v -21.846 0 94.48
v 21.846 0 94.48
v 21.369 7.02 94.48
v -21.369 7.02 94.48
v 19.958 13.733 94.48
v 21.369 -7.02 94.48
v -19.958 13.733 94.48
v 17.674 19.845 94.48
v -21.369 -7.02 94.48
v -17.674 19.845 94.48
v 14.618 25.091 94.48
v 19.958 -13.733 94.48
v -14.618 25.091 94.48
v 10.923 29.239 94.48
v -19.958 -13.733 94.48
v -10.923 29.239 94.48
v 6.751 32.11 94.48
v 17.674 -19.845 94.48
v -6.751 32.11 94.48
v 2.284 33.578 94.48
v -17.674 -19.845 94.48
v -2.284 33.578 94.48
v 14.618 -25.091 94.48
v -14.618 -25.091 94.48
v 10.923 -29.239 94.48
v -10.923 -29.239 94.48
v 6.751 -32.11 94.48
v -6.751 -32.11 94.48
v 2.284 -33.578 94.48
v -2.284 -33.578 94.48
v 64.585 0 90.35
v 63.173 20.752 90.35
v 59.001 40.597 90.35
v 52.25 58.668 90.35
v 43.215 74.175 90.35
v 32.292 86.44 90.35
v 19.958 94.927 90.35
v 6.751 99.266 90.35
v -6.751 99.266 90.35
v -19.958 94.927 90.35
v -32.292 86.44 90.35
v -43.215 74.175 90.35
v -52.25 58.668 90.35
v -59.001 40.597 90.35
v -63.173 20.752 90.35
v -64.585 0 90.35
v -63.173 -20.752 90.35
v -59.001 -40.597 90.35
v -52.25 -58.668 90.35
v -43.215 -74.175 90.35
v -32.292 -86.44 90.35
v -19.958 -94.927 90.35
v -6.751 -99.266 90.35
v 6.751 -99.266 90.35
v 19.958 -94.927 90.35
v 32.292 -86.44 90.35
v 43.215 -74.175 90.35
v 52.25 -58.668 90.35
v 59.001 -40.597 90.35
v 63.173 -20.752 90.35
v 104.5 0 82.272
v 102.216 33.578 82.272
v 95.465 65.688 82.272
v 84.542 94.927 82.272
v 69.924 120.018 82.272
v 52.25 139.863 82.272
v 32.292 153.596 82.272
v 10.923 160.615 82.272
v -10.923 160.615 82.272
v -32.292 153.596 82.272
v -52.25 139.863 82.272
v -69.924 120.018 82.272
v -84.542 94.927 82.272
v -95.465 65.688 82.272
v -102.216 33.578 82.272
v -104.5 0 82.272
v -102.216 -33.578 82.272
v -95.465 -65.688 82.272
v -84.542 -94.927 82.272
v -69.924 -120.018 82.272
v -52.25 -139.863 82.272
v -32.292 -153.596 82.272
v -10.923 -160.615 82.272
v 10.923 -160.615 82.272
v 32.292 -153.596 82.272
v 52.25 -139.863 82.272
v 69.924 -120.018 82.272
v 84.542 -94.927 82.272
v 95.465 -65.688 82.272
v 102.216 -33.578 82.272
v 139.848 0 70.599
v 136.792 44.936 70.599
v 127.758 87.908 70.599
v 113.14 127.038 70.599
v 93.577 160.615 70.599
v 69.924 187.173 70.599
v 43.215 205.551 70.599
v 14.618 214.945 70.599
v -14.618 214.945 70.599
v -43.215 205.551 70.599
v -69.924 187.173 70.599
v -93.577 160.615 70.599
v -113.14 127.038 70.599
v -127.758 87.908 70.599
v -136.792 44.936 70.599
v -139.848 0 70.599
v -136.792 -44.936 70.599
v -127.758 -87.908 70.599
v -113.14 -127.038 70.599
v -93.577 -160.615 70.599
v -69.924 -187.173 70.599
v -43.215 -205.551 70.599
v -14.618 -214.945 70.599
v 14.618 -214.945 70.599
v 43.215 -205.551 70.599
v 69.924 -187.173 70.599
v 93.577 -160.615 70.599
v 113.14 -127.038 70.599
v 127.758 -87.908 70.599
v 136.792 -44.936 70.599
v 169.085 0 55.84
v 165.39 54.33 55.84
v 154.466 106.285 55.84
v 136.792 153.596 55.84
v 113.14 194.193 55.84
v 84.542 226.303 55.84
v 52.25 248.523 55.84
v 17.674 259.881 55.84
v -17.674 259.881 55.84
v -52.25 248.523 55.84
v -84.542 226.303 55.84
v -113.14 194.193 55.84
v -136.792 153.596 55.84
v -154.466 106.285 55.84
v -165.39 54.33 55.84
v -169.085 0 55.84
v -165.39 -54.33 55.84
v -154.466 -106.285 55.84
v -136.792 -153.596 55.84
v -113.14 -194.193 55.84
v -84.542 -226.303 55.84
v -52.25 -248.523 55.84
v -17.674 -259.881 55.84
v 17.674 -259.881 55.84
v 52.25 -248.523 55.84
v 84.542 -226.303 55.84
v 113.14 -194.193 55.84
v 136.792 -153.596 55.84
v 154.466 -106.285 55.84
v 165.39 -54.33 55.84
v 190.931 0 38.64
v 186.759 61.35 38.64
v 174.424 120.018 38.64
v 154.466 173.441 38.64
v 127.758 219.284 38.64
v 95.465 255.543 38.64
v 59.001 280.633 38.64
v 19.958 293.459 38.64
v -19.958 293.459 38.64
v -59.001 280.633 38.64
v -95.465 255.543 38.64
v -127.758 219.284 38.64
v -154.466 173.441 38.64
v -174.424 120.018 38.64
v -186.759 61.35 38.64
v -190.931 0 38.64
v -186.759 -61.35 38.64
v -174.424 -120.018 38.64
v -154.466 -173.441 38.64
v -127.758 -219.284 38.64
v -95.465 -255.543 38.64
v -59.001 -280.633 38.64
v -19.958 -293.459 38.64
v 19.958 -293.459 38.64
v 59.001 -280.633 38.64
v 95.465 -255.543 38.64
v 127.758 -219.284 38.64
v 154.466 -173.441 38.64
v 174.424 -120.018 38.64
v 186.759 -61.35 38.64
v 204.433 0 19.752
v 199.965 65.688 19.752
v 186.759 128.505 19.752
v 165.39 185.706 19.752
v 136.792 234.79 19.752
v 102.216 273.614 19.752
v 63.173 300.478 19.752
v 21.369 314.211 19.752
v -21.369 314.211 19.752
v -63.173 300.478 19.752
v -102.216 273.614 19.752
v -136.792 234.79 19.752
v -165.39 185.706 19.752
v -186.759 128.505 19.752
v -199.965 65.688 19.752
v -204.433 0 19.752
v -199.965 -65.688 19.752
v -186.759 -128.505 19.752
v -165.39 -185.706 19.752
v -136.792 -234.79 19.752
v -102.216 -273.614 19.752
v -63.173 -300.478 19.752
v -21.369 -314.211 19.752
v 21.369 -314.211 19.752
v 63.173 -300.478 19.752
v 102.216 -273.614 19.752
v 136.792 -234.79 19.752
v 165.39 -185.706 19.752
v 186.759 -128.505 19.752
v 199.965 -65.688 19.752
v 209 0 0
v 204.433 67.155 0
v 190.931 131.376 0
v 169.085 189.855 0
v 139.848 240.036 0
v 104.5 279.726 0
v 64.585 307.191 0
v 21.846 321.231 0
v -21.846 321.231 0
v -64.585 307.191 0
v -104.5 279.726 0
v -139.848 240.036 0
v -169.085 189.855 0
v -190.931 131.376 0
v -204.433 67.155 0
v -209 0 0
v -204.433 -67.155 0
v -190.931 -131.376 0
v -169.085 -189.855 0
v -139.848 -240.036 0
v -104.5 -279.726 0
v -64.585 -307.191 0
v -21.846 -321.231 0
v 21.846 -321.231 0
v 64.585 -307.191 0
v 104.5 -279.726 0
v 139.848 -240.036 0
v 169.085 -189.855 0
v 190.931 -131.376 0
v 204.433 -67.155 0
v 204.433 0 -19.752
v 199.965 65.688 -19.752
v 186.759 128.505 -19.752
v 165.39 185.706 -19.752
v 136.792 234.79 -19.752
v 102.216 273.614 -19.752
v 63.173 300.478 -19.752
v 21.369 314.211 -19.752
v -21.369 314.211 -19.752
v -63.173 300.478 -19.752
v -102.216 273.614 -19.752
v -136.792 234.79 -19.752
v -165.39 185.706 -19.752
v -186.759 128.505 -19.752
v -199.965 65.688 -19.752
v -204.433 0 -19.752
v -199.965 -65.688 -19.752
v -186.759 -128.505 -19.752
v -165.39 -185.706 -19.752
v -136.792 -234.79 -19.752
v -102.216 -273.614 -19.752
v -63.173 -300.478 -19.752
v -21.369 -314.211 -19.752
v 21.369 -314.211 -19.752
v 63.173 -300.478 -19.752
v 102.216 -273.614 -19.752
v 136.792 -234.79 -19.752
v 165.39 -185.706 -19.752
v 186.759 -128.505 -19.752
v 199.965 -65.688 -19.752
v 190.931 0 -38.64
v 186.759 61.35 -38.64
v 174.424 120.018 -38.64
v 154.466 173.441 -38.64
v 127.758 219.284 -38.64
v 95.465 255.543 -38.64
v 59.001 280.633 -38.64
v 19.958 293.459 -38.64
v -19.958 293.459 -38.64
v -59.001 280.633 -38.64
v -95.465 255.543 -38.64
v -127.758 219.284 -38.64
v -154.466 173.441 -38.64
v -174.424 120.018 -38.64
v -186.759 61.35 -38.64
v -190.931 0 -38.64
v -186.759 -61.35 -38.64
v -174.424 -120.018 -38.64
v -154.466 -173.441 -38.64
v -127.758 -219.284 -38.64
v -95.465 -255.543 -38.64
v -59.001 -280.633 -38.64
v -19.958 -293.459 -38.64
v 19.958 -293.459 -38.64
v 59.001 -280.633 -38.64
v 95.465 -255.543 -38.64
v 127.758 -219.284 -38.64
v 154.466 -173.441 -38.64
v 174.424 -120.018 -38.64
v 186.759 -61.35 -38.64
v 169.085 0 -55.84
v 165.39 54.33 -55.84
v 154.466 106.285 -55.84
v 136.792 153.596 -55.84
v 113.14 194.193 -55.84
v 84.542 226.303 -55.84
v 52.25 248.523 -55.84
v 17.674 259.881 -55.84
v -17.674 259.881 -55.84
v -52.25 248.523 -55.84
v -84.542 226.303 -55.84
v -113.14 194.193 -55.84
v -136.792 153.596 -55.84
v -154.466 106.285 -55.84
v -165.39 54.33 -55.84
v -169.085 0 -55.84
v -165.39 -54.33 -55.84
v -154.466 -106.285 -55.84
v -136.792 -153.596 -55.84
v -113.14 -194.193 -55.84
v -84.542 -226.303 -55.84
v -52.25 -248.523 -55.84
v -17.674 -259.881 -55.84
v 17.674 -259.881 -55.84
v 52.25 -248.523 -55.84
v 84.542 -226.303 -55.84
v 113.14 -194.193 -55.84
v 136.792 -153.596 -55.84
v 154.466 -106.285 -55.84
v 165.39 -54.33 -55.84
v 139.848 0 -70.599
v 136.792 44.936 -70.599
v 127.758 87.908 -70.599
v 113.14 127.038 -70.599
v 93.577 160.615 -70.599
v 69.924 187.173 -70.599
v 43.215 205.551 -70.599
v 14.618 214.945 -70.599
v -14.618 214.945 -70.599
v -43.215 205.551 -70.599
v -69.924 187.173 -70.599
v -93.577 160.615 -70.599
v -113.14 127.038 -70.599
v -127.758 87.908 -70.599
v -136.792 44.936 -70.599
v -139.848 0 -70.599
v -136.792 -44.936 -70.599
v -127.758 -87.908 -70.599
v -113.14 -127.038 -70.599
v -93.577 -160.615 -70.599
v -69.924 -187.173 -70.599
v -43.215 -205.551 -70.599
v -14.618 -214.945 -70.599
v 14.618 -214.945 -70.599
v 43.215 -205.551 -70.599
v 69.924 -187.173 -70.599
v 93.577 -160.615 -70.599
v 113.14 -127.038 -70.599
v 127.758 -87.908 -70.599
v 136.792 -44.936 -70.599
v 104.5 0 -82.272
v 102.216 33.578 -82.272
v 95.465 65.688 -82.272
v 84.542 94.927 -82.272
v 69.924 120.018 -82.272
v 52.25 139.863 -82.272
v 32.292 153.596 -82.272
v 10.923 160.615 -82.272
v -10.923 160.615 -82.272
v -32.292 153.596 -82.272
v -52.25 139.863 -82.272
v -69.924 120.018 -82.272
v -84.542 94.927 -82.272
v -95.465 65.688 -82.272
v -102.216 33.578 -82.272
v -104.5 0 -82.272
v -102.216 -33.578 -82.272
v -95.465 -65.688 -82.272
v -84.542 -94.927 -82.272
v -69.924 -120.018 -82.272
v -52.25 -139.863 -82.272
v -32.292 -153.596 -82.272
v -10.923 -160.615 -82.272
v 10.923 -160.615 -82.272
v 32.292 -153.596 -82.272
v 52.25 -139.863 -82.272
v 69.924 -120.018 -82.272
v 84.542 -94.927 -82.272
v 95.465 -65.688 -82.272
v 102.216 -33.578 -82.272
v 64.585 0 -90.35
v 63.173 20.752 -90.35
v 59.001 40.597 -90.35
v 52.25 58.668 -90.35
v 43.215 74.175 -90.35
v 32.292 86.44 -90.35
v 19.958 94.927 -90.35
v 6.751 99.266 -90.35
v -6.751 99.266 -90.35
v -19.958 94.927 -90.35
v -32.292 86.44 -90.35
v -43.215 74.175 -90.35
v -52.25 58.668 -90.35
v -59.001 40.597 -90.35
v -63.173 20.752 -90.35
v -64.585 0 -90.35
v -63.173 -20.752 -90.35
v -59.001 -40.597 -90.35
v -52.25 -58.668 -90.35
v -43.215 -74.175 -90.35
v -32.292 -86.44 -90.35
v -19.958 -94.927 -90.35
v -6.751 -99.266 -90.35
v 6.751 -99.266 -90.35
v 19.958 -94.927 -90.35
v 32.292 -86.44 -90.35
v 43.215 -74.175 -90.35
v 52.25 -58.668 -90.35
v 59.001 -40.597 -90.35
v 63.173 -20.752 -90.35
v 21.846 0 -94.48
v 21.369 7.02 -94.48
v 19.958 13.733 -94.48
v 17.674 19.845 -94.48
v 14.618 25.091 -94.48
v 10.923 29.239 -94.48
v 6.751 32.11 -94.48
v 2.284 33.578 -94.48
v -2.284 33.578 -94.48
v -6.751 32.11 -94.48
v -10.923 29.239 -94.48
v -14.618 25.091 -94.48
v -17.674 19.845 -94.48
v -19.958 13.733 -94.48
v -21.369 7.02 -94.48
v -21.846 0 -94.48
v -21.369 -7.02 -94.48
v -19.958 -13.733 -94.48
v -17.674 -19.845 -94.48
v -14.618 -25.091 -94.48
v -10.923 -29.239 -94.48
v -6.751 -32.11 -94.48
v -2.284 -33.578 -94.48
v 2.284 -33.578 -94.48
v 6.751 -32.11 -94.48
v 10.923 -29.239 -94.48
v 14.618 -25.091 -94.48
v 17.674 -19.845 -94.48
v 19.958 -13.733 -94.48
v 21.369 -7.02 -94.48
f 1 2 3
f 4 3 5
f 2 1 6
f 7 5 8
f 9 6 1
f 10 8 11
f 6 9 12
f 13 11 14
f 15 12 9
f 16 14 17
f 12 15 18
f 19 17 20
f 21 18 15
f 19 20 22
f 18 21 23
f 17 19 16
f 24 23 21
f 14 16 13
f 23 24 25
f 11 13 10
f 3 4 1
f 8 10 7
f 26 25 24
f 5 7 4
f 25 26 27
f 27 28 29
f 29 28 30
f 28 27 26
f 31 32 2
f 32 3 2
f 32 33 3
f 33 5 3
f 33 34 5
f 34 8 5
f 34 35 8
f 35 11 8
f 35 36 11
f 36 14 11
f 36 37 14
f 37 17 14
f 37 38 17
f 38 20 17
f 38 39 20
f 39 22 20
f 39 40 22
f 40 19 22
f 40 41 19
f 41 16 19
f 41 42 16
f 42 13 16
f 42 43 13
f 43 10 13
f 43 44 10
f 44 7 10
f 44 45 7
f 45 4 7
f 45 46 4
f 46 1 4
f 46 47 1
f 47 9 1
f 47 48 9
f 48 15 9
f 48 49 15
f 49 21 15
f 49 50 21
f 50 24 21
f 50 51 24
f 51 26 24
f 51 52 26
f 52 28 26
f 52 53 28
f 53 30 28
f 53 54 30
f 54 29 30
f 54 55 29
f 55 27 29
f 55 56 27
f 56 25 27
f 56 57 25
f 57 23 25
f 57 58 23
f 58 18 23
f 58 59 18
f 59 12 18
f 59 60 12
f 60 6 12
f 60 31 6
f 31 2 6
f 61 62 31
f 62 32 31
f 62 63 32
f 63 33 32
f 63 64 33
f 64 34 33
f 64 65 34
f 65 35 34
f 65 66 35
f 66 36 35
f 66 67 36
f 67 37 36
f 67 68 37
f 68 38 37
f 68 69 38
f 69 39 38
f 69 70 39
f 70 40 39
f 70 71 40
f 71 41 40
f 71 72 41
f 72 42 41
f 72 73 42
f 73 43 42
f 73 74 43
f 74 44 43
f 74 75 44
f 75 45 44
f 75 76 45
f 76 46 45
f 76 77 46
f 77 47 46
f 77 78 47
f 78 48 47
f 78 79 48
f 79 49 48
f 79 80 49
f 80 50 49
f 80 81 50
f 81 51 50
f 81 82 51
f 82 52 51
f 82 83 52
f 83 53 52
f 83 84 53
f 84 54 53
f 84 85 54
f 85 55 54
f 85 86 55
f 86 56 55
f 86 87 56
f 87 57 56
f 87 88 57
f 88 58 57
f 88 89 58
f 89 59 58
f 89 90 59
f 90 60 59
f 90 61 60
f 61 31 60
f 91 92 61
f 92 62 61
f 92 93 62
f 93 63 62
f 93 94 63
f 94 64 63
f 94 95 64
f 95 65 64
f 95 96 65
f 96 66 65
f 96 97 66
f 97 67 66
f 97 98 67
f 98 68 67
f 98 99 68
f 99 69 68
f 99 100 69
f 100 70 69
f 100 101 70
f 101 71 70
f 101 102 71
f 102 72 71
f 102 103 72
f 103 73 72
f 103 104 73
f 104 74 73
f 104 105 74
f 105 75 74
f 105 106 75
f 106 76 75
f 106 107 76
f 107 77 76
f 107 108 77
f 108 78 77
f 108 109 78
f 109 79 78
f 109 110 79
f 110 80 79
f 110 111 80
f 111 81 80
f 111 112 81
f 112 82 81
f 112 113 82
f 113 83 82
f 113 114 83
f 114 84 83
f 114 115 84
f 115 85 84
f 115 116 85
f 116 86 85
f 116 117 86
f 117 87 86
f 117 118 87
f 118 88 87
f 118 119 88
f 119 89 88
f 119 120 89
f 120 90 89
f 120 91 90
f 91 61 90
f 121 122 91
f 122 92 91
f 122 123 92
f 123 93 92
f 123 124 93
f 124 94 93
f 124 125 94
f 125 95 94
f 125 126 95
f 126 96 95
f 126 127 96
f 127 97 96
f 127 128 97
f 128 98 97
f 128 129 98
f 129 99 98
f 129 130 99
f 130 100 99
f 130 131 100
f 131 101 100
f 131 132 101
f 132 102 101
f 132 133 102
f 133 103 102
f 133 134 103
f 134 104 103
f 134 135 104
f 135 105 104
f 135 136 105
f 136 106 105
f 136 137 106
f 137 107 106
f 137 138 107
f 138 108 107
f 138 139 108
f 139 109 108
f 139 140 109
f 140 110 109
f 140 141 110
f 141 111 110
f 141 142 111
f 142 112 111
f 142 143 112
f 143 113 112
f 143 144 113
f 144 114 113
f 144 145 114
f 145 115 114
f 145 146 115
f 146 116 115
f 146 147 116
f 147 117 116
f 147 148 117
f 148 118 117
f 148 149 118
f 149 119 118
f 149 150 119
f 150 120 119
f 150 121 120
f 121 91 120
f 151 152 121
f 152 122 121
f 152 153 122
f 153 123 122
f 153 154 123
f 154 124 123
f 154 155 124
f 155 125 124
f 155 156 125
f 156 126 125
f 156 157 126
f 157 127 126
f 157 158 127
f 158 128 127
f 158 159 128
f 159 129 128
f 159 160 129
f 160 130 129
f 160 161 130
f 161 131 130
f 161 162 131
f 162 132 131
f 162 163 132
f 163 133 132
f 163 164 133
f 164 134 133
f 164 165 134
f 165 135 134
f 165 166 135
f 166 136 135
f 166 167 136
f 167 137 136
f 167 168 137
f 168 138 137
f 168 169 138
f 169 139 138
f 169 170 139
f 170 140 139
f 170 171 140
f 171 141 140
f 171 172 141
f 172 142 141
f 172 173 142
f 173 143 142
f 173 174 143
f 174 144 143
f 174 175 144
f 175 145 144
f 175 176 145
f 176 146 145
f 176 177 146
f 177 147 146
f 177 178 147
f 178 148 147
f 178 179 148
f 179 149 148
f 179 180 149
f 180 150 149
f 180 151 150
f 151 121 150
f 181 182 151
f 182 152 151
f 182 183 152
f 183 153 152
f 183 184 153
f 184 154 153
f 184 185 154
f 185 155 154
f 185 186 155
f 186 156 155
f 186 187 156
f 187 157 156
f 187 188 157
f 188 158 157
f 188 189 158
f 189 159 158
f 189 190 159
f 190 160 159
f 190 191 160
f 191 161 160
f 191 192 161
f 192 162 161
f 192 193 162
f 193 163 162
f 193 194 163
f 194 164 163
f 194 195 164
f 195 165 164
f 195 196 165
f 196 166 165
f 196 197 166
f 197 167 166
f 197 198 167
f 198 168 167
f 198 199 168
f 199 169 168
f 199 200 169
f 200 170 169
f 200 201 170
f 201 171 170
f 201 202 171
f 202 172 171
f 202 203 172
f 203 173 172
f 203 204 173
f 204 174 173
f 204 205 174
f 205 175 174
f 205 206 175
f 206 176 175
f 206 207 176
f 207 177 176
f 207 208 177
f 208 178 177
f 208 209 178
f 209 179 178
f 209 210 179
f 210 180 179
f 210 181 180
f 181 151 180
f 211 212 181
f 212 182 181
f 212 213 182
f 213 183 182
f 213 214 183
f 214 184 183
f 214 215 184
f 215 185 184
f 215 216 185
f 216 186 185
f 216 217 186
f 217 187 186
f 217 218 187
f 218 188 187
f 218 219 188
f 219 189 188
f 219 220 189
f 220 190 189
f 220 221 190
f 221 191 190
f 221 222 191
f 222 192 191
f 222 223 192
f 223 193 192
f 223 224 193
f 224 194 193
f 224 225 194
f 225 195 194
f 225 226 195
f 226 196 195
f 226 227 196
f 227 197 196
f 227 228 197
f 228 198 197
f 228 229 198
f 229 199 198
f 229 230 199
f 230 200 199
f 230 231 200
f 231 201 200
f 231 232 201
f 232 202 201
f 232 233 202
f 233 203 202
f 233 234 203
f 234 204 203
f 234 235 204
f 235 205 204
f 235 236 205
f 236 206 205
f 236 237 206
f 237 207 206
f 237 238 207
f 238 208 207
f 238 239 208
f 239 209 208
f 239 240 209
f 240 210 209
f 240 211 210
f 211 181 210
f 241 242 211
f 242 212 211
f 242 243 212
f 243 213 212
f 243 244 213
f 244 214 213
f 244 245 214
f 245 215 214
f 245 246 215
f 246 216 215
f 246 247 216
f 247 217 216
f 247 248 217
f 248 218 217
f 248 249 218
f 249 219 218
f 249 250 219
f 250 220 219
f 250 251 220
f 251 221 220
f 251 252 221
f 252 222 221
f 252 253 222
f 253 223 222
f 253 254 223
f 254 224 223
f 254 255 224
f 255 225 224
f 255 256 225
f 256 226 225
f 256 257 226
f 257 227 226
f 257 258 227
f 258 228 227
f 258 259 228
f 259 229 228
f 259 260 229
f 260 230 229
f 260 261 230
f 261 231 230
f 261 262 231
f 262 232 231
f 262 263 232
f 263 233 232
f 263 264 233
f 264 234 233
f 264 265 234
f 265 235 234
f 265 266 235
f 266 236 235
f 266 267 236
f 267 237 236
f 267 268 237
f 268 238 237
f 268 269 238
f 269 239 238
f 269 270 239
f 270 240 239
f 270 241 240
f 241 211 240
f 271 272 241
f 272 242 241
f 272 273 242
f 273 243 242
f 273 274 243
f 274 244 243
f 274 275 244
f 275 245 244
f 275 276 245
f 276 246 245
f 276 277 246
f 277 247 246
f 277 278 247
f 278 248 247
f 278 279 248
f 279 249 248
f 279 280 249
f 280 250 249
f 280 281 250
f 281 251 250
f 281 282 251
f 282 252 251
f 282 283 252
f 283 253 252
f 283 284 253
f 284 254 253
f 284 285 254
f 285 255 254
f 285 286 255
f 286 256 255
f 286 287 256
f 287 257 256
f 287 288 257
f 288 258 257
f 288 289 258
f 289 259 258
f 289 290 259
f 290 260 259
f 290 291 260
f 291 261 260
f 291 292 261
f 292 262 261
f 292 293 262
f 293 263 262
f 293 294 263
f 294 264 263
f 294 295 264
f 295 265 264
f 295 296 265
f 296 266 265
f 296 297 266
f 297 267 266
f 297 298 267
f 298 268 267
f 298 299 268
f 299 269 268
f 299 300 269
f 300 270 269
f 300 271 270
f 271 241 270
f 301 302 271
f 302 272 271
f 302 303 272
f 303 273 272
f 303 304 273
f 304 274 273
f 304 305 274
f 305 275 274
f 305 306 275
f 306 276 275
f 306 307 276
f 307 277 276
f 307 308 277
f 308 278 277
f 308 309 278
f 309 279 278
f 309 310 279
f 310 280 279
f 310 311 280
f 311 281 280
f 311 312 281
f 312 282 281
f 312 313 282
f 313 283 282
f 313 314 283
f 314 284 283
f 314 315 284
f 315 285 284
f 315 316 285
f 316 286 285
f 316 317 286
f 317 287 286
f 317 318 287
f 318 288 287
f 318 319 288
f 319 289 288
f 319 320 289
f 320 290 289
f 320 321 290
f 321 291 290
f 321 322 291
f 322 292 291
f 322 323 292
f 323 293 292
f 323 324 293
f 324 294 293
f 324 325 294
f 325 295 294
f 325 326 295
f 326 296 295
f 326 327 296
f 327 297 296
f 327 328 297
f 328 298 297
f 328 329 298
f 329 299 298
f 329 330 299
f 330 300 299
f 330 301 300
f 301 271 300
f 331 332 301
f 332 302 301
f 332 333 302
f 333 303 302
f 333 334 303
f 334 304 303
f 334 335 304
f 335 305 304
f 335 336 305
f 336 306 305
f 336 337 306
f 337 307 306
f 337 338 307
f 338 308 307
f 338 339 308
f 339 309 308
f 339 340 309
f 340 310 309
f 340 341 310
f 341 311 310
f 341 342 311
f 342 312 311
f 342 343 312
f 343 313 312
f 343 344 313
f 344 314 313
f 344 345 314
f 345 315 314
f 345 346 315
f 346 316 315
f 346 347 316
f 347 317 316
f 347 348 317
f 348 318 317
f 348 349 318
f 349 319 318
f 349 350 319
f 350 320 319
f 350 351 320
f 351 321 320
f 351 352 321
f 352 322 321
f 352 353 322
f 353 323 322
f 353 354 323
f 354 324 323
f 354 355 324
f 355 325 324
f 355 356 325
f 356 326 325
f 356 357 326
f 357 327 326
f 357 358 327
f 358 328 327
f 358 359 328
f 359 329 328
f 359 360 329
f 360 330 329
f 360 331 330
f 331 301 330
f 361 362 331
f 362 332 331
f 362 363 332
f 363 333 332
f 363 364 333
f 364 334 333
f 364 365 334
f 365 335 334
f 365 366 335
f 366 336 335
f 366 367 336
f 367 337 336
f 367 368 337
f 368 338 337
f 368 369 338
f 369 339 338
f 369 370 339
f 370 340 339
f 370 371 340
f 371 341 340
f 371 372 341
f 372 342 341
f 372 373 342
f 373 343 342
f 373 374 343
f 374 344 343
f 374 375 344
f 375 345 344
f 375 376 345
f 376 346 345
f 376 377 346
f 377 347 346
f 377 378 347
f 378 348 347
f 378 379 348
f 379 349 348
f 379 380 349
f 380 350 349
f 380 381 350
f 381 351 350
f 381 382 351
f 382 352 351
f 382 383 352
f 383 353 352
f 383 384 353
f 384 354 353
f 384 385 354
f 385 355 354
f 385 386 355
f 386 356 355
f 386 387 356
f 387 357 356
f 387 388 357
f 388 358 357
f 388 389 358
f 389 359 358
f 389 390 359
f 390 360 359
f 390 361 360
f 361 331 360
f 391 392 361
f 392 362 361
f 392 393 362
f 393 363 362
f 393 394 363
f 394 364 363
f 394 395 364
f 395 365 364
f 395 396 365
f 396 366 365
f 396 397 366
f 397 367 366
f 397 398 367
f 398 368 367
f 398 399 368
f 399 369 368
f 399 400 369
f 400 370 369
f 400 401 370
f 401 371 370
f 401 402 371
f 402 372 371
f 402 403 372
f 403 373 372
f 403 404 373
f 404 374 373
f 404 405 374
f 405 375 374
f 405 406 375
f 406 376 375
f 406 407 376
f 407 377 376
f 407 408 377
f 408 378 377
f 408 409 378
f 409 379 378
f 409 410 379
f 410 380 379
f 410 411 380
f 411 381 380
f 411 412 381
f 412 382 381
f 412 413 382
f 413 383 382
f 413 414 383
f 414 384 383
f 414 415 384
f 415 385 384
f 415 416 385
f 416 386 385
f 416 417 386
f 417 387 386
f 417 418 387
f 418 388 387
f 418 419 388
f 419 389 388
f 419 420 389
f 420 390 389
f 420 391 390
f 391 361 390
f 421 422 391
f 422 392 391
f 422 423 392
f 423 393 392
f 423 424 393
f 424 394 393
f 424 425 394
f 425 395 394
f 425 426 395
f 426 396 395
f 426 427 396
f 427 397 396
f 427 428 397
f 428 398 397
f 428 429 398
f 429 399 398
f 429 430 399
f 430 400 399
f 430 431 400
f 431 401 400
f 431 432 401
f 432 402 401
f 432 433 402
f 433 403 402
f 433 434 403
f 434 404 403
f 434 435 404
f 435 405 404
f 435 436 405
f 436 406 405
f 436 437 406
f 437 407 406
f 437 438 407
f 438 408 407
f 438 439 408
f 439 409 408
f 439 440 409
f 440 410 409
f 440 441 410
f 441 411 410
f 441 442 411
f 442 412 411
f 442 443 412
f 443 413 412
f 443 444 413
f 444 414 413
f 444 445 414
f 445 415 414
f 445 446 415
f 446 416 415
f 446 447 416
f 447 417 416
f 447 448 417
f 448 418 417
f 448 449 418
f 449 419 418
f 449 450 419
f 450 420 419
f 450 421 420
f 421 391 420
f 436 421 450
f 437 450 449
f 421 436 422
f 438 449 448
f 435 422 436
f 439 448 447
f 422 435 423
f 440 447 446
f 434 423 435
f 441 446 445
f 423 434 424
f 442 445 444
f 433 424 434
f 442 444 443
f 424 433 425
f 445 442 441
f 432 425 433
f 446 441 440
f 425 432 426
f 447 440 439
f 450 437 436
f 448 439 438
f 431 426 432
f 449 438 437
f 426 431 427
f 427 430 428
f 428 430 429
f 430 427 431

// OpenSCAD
// Generated by SolidPython 1.0.1 on 2020-07-29 00:46:50


scale(v = [11, 17, 5]) {
	sphere(r = 19);
}
/***********************************************
*********      SolidPython code:      **********
************************************************
 
# import packages: SolidPython
from solid import *
from solid.utils import *
from itertools import chain, combinations, permutations


class Resize:

    def __init__(self, scad_file):
        self.scad_file = scad_file
        #self.scad_file = import_scad(scad_file)
        # cone/cylinder param:
        self.r1 = 0
        self.r2 = 0
        self.h = 0
        # rectangular prism param:
        self.w = 0
        self.l = 0
        # ellipse param:
        self.r = 0

    # import OpenScad code (file name corresponds to shape)


    # classify shape + parameters
    def assign(self, param1, param2, param3):
        if self.scad_file == 'cone.scad':
            self.r1 = param1
            self.r2 = param2
            self.h = param3
        elif self.scad_file == 'cylinder.scad':
            self.r1 = param1
            self.r2 = param2
            self.h = param3
        elif self.scad_file == 'rectangularPrism.scad':
            self.h = param1
            self.l = param2
            self.w = param3
        else:
            self.r = param1
            self.h = param2

    # resize parameters
    def iterate(self):
        x = range(3, 20, 2)
        i = 1
        if self.scad_file == 'cone.scad':
            tempList = list(permutations(x, 2))
            for temp in tempList:
                param1 = temp[0]
                param2 = temp[1]
                filepath = 'produced_scad_files/' + 'cone' + str(param1) + '_' + str(param2) + '_' + '.scad'
                scad_render_to_file(cylinder(h=param1, r1=param2, r2=0), filepath)

        elif self.scad_file == 'cylinder.scad':
            tempList = list(permutations(x, 3))
            for temp in tempList:
                param1 = temp[0]
                param2 = temp[1]
                filepath = 'produced_scad_files/' + 'cylinder' + str(param1) + '_' + str(param2) + '_' + '.scad'
                scad_render_to_file(cylinder(h=param1, r1=param2, r2=param2), filepath)

        elif self.scad_file == 'rectangularPrism.scad':
            tempList = list(permutations(x, 3))
            for temp in tempList:
                param1 = temp[0]
                param2 = temp[1]
                param3 = temp[2]
                filepath = 'produced_scad_files/' + 'rectangularPrism' + str(param1) + '_' + str(param2) + '_' + str(
                    param3) + '.scad'
                scad_render_to_file(cube(size=(param1, param2, param3)), filepath)

        elif self.scad_file == 'ellipse.scad':
            tempList = list(permutations(x, 4))
            for temp in tempList:
                param1 = temp[0]
                param2 = temp[1]
                param3 = temp[2]
                param4 = temp[3]
                filepath = 'produced_scad_files/' + 'ellipse' + str(param1) + '_' + str(param2) + '_' + str(param3) + '_' + str(param4) + '.scad'
                scad_render_to_file(scale([param1, param2, param3])(sphere(r=param4)), filepath)

    def render_to_scadfile(self):
        scad_render_to_file(scad, 'example.scad') 
 
************************************************/
